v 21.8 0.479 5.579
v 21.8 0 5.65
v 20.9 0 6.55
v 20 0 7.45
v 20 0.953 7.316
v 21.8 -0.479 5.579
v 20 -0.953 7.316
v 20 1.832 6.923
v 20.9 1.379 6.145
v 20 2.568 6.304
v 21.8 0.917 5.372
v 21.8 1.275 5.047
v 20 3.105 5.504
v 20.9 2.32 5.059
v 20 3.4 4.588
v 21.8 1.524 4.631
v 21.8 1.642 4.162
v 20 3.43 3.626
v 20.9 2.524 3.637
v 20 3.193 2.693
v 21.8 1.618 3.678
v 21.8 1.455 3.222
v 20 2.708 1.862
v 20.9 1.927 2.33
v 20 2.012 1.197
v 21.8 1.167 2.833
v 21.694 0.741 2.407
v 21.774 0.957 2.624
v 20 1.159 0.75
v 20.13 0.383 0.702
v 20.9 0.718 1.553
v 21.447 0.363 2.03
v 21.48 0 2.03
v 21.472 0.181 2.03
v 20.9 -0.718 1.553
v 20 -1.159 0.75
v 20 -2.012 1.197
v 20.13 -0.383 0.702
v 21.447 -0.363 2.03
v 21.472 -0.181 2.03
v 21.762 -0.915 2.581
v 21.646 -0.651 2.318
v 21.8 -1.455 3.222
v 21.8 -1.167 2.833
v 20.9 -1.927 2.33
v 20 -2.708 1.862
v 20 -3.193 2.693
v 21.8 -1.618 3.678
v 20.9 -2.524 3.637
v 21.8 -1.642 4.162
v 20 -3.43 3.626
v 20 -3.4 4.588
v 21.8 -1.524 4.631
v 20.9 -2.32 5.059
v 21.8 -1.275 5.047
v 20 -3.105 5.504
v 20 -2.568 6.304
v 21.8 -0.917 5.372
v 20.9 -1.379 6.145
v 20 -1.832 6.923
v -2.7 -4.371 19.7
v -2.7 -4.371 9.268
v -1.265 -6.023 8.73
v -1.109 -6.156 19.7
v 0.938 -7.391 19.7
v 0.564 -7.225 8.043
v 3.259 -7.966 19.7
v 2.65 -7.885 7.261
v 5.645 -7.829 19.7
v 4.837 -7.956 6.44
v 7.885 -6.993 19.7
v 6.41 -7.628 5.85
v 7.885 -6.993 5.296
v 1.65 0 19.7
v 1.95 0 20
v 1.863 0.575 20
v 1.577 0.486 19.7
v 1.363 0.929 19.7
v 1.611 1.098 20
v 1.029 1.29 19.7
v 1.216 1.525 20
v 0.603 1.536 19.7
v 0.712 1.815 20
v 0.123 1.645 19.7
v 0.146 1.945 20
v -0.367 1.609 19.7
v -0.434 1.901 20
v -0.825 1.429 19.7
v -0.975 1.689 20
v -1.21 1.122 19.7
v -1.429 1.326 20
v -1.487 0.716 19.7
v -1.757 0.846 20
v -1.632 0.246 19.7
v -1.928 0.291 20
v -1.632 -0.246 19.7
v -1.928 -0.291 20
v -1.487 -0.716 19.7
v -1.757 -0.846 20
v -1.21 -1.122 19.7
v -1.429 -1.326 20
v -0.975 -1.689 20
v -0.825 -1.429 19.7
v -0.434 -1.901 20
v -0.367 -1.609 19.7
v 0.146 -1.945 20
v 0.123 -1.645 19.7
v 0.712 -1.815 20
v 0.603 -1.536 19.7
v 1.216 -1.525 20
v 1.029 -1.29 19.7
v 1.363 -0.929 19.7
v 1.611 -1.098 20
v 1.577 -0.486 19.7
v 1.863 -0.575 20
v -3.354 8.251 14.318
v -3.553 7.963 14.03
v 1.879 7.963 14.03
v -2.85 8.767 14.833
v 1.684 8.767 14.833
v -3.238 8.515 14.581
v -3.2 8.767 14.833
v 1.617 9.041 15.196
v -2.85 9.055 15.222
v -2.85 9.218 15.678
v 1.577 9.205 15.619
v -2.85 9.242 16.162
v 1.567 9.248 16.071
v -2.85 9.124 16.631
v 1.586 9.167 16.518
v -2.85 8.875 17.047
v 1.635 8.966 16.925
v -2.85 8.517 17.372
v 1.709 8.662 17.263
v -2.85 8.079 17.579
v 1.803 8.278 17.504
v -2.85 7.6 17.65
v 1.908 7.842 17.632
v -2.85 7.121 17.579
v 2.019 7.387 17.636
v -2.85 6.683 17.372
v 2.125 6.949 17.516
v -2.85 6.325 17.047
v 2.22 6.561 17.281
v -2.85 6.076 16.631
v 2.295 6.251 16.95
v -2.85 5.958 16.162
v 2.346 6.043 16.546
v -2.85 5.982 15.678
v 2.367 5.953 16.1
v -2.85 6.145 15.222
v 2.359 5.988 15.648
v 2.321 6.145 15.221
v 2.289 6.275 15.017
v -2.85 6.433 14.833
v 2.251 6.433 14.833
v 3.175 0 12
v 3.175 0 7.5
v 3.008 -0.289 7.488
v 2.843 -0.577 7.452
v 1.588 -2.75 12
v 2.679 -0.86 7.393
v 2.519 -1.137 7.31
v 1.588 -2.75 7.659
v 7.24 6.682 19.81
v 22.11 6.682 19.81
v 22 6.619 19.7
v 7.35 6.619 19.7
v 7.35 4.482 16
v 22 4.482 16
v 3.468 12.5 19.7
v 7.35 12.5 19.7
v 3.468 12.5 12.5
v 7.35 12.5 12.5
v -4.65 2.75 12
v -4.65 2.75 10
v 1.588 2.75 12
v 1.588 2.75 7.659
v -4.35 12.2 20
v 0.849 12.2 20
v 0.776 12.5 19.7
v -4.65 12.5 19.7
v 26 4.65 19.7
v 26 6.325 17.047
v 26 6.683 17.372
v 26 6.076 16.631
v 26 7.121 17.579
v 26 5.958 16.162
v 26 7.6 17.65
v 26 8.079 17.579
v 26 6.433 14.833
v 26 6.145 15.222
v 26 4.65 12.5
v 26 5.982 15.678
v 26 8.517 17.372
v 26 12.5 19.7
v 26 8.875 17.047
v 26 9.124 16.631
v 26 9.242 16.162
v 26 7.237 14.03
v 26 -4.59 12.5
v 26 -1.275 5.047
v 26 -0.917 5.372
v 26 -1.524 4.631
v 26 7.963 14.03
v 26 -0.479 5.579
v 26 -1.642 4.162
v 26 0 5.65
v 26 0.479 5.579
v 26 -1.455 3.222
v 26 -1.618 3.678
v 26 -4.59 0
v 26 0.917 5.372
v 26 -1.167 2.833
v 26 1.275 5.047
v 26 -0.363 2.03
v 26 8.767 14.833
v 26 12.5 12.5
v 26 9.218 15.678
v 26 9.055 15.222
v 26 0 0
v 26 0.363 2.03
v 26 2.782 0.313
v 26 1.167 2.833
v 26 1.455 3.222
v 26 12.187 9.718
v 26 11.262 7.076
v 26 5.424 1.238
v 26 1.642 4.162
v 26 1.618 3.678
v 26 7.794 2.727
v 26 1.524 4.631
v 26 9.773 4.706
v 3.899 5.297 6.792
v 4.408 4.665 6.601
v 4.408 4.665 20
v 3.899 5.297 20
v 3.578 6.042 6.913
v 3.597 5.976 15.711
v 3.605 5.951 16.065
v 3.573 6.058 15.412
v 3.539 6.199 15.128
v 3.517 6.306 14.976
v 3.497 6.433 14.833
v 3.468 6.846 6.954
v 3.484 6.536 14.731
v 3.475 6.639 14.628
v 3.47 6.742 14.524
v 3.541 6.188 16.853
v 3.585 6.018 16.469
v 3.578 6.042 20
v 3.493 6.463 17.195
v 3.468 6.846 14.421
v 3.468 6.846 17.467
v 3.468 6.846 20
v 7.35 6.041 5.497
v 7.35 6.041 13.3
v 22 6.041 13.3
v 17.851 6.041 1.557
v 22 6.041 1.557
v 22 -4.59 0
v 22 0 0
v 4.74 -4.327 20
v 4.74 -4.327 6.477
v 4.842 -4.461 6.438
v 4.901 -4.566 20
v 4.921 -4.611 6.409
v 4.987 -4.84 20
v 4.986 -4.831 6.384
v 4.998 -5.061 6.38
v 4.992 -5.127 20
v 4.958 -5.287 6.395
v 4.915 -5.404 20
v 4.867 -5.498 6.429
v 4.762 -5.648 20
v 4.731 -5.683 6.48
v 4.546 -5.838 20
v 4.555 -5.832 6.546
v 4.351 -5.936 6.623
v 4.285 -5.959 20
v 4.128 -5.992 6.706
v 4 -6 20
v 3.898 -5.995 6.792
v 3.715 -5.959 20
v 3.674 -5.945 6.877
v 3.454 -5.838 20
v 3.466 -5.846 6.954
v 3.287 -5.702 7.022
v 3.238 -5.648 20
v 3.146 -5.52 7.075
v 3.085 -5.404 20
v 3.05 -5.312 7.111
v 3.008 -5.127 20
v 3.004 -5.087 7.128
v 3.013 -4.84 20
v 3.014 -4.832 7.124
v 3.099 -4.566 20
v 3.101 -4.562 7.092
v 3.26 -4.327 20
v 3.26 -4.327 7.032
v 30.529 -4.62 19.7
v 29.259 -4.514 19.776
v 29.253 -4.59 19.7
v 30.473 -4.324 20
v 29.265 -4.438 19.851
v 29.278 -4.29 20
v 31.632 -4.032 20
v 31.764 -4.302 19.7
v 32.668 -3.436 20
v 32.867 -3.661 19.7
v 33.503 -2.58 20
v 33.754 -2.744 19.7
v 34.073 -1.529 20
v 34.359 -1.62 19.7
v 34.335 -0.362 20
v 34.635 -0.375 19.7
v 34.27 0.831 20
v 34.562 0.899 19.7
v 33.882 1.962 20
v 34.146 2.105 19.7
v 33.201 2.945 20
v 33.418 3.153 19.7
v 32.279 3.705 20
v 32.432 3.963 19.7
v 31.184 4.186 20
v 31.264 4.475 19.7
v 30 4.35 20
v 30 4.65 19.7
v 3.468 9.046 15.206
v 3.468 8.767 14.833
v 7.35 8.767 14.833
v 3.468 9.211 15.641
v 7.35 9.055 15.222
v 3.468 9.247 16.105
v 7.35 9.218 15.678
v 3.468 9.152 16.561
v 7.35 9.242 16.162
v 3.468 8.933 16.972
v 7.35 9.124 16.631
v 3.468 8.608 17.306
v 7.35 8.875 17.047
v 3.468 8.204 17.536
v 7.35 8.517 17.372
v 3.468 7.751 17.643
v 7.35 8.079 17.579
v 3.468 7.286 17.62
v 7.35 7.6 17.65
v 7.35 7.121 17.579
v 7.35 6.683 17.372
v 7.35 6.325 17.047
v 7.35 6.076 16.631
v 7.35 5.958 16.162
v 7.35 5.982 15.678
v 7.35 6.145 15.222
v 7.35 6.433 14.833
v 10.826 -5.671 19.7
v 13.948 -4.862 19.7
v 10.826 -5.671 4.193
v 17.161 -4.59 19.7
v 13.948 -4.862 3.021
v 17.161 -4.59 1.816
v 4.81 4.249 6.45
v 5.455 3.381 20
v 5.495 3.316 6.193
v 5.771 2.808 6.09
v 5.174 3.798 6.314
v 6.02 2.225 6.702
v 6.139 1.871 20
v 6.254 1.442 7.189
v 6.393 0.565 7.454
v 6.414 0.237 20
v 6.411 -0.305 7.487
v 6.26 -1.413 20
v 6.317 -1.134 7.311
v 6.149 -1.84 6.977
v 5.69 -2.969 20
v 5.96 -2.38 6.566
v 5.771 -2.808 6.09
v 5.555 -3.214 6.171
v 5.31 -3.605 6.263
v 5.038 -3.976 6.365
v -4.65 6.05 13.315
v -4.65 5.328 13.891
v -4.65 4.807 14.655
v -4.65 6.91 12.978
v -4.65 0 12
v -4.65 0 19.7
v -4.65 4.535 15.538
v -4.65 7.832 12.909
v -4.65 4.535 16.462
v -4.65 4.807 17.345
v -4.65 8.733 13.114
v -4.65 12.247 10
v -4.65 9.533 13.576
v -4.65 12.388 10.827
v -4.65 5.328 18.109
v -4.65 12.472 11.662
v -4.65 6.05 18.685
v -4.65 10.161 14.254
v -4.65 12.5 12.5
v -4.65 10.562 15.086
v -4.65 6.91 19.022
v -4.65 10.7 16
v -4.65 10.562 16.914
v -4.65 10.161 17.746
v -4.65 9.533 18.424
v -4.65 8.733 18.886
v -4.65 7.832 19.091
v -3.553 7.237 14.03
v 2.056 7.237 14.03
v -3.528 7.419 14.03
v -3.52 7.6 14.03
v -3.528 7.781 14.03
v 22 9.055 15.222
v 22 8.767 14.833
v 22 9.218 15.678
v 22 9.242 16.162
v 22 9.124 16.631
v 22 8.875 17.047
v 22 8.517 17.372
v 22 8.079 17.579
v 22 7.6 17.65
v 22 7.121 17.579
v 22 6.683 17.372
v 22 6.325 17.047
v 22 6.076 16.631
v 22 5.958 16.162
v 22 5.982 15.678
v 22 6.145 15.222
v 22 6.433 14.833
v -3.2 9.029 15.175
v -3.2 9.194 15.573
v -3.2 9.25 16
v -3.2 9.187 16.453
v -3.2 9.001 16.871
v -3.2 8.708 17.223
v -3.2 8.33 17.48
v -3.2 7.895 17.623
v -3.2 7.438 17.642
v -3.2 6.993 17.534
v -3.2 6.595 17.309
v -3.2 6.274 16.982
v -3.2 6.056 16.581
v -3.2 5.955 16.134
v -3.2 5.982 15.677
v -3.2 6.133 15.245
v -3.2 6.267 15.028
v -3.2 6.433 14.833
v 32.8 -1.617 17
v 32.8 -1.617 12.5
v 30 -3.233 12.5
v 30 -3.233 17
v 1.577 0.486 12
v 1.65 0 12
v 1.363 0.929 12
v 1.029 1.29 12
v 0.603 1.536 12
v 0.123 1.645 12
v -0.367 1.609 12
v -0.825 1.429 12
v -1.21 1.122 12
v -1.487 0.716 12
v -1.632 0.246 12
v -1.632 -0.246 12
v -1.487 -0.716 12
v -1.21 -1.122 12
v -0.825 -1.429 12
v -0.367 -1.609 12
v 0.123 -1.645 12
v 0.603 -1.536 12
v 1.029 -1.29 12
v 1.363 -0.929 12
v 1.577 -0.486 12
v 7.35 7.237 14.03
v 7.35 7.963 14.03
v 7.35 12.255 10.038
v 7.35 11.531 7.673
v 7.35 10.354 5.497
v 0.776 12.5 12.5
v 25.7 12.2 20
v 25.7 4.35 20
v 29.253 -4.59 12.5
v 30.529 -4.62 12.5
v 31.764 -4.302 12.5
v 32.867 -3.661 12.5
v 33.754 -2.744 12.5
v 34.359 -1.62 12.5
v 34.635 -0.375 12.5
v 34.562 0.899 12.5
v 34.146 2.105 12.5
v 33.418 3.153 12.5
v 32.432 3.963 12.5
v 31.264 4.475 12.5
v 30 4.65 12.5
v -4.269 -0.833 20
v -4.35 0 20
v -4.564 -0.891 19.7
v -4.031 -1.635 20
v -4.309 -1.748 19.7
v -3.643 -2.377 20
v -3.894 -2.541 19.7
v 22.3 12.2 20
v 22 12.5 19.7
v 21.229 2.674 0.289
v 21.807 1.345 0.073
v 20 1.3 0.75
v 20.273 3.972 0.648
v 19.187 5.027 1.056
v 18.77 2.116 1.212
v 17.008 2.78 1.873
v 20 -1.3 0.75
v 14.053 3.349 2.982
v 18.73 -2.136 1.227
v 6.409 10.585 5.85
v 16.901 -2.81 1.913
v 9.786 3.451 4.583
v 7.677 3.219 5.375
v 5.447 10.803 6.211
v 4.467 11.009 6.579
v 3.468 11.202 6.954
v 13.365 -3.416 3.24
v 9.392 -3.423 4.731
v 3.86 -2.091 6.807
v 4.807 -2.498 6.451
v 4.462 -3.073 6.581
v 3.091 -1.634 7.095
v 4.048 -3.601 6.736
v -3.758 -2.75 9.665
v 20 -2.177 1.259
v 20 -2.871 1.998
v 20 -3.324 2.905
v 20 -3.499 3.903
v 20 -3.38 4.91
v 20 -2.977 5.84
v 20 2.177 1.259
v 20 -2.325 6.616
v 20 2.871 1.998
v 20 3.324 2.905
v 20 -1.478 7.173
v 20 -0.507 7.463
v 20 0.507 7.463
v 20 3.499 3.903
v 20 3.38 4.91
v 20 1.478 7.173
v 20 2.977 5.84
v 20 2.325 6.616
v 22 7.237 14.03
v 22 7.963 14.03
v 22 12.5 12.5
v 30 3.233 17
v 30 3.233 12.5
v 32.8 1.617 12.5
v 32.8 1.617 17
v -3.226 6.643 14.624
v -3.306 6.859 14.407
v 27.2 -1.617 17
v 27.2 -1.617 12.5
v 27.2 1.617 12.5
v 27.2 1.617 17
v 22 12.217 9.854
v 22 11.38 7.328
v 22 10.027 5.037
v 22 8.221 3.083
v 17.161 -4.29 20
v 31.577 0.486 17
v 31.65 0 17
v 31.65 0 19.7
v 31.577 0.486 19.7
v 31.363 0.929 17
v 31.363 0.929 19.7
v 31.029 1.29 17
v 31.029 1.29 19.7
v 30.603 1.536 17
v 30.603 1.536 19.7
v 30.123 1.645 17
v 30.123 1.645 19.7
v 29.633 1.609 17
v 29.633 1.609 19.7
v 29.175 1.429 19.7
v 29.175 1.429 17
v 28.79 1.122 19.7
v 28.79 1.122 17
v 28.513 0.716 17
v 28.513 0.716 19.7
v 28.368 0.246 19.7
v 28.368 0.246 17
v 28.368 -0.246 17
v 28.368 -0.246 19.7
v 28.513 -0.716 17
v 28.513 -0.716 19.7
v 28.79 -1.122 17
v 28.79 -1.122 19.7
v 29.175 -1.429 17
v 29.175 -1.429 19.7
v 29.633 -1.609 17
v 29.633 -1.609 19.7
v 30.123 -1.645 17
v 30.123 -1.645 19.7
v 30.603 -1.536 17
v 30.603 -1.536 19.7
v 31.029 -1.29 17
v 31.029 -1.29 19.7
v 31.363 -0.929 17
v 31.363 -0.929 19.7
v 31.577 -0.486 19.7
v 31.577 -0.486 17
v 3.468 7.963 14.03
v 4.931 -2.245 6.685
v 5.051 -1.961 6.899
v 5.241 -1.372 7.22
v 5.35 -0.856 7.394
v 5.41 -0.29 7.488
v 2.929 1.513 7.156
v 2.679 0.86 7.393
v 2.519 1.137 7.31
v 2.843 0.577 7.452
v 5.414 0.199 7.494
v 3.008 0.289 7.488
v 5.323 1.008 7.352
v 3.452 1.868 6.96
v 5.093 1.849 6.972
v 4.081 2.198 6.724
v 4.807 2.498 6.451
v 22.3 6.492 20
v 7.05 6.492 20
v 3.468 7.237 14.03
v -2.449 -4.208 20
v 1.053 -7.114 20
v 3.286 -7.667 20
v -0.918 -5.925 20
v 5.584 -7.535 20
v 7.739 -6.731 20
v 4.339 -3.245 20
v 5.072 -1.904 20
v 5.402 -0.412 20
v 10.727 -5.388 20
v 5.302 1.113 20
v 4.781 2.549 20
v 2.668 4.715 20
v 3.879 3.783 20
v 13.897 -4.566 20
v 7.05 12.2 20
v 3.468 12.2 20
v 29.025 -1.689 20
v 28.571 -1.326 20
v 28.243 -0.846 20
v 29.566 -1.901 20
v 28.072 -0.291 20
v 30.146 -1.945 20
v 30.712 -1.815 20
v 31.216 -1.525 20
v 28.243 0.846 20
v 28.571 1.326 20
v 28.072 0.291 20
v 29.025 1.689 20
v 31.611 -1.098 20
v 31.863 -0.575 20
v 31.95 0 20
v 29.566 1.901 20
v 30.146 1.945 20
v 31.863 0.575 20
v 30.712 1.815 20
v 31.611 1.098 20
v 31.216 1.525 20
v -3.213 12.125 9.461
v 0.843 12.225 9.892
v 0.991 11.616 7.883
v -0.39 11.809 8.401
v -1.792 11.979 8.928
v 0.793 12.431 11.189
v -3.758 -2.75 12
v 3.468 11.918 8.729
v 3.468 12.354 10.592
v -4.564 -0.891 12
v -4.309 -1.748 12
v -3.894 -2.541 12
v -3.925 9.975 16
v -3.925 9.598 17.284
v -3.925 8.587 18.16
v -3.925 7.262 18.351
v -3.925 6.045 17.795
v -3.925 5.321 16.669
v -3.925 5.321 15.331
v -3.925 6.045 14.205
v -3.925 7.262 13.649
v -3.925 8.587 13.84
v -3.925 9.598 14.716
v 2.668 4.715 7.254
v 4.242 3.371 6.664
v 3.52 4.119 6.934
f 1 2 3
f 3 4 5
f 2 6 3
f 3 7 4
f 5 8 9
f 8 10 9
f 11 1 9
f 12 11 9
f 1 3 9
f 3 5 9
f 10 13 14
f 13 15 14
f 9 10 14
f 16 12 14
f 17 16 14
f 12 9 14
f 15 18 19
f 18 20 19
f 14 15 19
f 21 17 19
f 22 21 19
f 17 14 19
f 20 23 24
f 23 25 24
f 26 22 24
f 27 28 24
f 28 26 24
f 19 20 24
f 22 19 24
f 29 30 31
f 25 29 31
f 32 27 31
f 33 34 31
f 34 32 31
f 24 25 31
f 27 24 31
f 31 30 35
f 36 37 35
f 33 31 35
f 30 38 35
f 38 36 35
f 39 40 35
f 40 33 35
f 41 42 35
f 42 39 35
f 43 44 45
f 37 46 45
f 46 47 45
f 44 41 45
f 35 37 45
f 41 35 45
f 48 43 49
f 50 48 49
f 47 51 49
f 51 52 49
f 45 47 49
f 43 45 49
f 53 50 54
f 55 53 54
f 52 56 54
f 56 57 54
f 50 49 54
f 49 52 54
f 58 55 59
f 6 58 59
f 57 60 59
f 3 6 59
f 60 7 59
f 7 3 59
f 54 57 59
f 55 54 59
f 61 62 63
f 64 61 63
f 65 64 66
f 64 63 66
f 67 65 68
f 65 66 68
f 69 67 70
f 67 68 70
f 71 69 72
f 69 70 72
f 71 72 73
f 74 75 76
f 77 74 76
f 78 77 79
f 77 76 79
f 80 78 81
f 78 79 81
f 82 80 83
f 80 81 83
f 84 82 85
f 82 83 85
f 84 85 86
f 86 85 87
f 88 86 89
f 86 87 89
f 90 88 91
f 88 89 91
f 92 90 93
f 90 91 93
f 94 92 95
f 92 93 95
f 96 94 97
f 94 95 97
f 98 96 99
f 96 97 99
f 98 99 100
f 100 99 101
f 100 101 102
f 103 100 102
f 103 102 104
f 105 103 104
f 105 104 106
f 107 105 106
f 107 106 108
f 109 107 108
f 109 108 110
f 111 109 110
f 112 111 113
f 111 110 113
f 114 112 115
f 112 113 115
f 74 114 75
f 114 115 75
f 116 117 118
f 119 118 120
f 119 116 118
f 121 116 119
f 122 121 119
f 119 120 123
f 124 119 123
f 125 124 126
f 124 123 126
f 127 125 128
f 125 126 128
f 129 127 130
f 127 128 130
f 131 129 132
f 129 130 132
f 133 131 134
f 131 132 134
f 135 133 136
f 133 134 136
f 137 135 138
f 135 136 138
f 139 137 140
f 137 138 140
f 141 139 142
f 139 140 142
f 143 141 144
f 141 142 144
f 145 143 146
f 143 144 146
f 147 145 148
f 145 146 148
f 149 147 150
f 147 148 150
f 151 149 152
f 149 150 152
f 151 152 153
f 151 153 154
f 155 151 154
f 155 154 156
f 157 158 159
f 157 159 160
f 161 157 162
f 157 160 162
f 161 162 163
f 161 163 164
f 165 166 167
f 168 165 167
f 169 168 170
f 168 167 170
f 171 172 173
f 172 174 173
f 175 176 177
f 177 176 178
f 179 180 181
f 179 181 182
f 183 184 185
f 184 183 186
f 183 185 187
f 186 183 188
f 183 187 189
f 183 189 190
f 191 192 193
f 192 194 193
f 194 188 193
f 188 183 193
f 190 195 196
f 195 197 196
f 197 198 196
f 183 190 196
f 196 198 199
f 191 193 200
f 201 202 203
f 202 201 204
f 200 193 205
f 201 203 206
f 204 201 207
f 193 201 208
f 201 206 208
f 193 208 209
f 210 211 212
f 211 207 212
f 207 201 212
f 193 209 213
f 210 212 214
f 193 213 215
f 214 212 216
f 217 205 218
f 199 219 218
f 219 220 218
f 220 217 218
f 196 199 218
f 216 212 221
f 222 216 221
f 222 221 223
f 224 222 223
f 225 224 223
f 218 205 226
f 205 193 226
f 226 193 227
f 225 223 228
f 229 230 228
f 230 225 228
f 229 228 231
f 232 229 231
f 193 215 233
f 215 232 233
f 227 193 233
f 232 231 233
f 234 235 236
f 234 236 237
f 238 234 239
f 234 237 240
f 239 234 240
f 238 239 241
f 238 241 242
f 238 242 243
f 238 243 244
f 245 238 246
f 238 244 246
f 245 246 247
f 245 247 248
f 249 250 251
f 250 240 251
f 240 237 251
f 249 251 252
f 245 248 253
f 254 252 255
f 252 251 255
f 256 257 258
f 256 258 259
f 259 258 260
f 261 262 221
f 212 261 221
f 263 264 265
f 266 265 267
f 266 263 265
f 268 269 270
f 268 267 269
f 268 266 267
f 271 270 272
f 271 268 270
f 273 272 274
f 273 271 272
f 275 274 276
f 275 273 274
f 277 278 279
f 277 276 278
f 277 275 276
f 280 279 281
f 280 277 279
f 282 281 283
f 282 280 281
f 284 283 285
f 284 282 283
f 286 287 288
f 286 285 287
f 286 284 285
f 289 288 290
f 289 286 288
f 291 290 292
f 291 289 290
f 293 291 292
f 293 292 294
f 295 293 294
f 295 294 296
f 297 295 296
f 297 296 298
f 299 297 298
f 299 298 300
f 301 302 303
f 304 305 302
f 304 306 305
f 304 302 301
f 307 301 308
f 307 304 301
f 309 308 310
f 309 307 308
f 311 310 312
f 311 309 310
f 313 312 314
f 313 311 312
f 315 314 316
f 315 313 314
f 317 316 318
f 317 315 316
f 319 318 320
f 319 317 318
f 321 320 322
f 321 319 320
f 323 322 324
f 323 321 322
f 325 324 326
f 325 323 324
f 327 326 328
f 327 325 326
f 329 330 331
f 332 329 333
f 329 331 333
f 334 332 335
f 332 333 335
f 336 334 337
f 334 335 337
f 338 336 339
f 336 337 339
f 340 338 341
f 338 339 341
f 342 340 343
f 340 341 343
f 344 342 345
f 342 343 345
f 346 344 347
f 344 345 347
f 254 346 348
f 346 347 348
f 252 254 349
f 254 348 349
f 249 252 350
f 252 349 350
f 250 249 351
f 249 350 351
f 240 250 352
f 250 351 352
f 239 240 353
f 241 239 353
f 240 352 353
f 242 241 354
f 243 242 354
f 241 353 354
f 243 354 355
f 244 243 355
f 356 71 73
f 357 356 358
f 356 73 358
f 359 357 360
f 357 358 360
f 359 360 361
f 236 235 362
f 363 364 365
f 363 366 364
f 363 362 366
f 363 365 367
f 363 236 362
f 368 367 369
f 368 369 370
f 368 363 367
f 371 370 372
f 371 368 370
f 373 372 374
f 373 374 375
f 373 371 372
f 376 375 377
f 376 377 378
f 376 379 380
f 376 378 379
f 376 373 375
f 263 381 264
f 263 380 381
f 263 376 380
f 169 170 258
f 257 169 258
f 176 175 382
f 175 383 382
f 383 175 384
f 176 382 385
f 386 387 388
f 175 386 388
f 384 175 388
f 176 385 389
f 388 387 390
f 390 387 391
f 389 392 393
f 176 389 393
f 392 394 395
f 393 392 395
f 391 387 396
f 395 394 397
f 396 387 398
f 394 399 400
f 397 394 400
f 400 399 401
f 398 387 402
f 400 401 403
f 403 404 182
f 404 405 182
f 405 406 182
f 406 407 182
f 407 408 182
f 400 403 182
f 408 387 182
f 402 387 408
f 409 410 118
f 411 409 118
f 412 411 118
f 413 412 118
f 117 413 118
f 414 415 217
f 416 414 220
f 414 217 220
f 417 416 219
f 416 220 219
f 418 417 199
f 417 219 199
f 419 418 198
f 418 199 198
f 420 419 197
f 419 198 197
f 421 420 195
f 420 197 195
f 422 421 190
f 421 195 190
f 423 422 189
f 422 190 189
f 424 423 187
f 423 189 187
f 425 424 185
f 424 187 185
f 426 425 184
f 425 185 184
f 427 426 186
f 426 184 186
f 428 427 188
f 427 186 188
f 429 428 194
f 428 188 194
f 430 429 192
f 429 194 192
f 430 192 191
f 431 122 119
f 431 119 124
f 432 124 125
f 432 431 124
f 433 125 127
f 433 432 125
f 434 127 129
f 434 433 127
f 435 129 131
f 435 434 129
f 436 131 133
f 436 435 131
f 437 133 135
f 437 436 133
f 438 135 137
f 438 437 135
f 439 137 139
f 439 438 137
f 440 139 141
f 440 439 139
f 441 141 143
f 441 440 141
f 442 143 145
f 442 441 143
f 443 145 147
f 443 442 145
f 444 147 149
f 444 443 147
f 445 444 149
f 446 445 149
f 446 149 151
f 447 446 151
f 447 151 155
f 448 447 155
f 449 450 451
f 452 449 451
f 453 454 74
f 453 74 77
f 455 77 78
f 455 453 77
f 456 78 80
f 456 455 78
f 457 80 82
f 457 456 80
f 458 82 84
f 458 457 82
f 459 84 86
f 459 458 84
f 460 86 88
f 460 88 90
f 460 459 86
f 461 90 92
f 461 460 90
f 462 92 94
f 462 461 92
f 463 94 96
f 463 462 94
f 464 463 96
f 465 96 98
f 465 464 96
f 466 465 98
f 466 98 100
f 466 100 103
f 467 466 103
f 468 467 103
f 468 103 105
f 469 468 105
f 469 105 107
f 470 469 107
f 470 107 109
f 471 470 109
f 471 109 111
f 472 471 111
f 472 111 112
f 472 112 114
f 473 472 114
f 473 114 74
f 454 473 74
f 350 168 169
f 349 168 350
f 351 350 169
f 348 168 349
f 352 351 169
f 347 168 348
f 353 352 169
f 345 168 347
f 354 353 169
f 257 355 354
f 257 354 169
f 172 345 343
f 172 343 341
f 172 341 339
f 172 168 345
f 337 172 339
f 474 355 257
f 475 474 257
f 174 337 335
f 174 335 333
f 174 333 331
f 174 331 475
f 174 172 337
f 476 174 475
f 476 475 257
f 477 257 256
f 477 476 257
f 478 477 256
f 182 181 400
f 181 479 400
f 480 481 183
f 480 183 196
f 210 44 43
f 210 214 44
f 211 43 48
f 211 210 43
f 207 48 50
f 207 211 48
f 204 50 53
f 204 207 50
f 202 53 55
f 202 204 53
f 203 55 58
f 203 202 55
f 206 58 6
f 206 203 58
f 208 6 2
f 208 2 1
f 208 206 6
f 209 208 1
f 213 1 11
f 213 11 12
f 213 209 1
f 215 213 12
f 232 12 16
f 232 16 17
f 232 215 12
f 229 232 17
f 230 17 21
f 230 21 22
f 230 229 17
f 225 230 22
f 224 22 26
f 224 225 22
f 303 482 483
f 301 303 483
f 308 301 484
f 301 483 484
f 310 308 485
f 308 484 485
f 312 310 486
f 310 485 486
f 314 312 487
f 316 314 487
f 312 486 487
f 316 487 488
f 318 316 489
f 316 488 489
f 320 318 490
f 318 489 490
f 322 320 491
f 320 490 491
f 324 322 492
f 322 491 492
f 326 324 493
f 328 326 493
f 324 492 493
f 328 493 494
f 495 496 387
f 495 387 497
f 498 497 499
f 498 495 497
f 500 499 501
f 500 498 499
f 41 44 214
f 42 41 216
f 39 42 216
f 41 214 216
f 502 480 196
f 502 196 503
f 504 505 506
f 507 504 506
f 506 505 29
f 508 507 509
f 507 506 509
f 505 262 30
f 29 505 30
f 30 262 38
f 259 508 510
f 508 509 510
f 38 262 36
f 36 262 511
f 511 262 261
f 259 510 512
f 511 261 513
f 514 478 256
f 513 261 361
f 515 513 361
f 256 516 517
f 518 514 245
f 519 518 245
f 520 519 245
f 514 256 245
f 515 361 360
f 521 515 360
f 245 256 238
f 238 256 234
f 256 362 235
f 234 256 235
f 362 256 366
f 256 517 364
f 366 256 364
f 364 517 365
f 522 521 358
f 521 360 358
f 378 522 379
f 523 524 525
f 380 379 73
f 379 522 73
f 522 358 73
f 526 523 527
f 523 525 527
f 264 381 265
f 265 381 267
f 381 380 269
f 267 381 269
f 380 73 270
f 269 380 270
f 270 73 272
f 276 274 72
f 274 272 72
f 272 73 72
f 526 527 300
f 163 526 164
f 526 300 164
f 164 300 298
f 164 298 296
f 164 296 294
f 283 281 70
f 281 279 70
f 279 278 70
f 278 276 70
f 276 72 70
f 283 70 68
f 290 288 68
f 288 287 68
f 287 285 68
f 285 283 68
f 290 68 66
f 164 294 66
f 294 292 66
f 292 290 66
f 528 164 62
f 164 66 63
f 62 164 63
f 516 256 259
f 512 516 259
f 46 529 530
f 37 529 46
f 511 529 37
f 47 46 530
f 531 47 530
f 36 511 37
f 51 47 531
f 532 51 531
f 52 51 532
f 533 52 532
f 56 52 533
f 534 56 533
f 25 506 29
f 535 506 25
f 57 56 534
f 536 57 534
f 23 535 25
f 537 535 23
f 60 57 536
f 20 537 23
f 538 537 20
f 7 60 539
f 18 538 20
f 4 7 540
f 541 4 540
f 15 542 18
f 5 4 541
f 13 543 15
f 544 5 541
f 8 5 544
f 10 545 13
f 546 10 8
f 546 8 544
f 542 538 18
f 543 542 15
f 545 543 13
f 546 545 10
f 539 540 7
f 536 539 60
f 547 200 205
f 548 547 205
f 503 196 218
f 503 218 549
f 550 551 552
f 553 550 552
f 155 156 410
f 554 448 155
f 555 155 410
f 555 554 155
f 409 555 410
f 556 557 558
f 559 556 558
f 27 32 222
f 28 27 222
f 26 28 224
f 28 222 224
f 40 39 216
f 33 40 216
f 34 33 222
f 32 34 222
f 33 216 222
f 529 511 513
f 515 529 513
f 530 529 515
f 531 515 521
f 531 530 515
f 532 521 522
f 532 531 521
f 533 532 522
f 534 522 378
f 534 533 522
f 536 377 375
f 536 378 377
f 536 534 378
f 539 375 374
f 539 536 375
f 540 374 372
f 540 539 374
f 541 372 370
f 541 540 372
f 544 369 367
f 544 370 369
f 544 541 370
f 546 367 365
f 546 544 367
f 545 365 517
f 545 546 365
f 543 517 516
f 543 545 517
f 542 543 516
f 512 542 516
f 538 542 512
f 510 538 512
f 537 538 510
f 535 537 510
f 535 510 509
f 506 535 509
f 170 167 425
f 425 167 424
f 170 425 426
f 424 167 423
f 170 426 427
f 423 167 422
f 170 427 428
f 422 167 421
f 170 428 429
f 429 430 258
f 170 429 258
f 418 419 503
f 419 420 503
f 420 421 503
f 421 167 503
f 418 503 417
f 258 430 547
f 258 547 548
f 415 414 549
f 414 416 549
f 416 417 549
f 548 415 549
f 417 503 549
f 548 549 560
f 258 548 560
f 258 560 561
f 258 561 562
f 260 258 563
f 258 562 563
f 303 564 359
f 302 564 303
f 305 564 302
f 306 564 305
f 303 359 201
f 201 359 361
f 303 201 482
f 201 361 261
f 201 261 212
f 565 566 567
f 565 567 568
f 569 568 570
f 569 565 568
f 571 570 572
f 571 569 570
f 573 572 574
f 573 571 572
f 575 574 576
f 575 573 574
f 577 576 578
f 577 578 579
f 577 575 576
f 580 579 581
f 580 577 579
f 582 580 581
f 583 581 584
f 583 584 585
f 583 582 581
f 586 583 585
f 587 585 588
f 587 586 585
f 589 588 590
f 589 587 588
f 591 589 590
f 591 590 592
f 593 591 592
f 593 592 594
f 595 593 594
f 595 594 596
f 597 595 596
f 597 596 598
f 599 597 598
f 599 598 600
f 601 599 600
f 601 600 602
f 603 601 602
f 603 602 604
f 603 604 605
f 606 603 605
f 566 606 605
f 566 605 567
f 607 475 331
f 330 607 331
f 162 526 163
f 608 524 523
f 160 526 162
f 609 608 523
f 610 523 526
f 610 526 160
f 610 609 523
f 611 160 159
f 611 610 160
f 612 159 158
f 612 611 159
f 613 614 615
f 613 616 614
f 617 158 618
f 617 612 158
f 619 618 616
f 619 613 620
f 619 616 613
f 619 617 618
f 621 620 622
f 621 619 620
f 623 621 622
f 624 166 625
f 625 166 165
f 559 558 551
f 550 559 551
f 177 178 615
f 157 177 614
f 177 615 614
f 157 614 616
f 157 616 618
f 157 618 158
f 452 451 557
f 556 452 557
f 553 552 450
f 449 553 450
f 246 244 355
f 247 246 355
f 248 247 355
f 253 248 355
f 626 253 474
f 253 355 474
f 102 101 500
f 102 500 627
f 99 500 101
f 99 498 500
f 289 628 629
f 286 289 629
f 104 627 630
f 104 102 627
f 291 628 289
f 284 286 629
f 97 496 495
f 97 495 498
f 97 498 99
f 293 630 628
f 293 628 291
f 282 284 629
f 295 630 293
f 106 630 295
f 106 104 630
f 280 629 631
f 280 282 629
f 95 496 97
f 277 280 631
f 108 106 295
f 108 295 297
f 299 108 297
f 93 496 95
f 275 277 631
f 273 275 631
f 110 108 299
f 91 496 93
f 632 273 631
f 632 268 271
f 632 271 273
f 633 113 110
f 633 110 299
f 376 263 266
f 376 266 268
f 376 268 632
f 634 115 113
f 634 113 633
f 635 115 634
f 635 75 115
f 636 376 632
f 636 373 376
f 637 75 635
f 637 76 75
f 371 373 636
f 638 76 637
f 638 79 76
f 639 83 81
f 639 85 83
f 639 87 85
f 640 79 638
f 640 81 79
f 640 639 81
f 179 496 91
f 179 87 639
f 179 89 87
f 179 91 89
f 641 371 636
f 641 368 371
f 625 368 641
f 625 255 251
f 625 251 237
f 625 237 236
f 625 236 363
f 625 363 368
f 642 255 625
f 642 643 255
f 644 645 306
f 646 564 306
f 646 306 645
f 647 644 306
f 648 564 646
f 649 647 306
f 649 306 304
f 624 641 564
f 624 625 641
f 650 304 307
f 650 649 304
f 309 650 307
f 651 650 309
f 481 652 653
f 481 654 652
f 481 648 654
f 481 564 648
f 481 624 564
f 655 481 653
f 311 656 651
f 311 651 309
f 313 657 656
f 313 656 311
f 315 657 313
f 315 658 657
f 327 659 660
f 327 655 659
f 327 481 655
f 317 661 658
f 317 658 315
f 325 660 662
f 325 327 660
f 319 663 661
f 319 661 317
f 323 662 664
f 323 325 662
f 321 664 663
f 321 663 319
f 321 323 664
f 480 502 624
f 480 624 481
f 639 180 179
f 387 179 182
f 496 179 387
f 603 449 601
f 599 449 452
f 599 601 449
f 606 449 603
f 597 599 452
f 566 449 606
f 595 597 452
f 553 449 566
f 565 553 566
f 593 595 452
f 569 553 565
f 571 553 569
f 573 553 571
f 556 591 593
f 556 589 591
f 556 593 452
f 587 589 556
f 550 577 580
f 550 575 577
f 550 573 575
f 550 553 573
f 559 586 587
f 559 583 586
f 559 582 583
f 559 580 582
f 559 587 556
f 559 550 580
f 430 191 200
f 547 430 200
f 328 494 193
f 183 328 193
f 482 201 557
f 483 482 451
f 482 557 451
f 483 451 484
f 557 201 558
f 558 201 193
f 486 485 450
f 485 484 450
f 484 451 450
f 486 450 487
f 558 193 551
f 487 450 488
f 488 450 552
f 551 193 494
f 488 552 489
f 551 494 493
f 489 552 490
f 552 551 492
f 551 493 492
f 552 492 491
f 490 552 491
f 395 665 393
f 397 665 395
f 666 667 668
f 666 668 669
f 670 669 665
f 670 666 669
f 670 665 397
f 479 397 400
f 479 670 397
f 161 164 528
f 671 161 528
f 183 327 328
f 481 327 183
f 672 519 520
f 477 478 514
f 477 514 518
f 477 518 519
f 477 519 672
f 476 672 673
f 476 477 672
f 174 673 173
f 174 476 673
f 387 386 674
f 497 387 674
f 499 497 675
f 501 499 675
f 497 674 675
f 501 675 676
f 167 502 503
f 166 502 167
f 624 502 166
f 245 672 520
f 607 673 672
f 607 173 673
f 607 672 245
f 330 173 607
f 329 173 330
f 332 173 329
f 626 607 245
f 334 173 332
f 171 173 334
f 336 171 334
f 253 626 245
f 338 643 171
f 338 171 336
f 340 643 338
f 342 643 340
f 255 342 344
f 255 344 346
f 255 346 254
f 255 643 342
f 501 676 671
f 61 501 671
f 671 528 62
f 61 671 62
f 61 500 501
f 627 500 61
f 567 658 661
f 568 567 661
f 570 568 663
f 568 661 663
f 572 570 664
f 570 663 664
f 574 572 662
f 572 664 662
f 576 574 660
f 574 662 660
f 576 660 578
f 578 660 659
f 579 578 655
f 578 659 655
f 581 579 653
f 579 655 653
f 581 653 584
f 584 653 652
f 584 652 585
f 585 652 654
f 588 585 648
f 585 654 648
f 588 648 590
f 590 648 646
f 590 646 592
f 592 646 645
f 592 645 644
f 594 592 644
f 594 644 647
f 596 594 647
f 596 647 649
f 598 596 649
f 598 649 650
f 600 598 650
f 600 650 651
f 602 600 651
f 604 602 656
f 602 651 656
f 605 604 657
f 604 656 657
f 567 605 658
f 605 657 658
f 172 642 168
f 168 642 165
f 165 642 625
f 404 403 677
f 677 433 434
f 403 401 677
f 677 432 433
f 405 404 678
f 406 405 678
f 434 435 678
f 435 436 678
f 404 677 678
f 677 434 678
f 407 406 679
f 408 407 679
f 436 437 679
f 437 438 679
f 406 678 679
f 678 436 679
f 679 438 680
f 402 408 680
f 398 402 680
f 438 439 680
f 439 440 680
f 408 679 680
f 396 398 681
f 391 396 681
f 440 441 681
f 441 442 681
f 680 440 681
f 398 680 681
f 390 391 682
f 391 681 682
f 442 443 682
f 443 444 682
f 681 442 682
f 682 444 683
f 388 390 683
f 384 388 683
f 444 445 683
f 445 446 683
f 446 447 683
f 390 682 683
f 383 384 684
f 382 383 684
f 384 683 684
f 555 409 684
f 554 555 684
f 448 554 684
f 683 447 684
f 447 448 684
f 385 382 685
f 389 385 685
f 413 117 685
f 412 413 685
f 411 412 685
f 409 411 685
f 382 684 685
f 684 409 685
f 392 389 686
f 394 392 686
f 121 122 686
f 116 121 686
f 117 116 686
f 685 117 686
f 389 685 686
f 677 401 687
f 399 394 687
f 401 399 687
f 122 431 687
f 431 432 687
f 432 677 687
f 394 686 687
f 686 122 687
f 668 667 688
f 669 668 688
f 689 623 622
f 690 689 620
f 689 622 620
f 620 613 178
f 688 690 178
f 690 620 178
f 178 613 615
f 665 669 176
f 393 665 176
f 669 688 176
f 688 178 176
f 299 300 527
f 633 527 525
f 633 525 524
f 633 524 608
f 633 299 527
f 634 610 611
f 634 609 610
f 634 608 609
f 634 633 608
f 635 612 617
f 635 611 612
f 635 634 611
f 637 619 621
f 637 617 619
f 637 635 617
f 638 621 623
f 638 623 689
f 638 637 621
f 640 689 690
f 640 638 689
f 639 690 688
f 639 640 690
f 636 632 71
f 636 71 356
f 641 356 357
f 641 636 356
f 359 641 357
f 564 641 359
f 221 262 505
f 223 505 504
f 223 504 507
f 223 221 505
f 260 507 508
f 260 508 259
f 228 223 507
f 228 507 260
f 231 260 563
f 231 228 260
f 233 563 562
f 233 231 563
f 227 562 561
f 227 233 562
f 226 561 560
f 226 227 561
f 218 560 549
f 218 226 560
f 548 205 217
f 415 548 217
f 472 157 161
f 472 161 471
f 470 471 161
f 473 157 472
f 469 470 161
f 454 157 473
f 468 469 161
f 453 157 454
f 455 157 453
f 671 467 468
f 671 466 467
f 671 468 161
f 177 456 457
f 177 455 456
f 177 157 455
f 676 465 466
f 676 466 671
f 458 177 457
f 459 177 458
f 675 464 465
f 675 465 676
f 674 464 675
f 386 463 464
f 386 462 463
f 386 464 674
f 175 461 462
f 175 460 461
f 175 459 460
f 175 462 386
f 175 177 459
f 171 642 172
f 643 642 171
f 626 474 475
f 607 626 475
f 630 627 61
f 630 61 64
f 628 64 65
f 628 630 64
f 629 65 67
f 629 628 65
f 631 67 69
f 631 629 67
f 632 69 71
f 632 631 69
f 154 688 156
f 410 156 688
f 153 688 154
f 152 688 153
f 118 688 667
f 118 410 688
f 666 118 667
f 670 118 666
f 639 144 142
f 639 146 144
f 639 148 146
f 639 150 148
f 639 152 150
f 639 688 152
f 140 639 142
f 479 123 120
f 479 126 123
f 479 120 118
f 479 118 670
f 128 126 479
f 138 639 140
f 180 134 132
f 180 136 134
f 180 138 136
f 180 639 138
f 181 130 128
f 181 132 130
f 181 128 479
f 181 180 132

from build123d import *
from OCP.BRepFilletAPI import BRepFilletAPI_MakeChamfer

# Parameters (mm, degrees)
SKETCH1_R                = 1.65
BOSS_EXTRUDE1_DEPTH      = 20
SKETCH3_R                = 1.65
CUT_EXTRUDE3_DEPTH       = 39.673925324
CUT_EXTRUDE4_DEPTH       = 12
CUT_EXTRUDE5_START       = -4
CUT_EXTRUDE5_DEPTH       = 14.65
CUT_EXTRUDE11_DEPTH      = 42.915062925
CUT_EXTRUDE11_DEPTH_BACK = 42.915062925
CUT_EXTRUDE10_DEPTH      = 5
CUT_EXTRUDE10_DEPTH_BACK = 39.898875305
SKETCH10_W               = 9.115200733
SKETCH10_H               = 9.576012389
CUT_EXTRUDE7_DEPTH       = 4.5
CUT_EXTRUDE8_DEPTH       = 36.587532929
CUT_EXTRUDE8_DEPTH_BACK  = 36.587532929
SKETCH8_R                = 1.65
CUT_EXTRUDE9_START       = 2
SKETCH9_R                = 3.5
CUT_EXTRUDE9_DEPTH       = 34.587532929
CHAMFER6_SIZE            = 1.8
CUT_EXTRUDE12_DEPTH      = 39.673925324
CHAMFER7_SIZE            = 0.3
CHAMFER7_SIZE2           = 0.219615242
CUT_EXTRUDE13_DEPTH      = 42.915062925
SKETCH14_R               = 3.1
CUT_EXTRUDE14_DEPTH      = 1.8
CHAMFER8_START           = -4.6500001
CHAMFER8_OUTLINE_R       = 3.1
CHAMFER8_DEPTH           = 1.8000001
CHAMFER8_START_2         = -4.65
CHAMFER8_3_DEPTH         = 1.8
FILLET1_R                = 3


with BuildPart() as part:
    # Sketch1 → Boss-Extrude1 (new body)
    with BuildSketch(Plane.XY):
        with BuildLine():
            Line((-3.894375, -2.540933561), (-2.7, -4.371498599))
            ThreePointArc((-2.7, -4.371498599), (2.076657931, -7.765356095), (7.885150706, -6.993254178))
            ThreePointArc((7.885150706, -6.993254178), (12.369935761, -5.200285461), (17.161085198, -4.589612979))
            Line((17.161085198, -4.589612979), (29.253037683, -4.589612979))
            ThreePointArc((29.253037683, -4.589612979), (34.634878658, -0.374699645), (30, 4.65))
            Line((30, 4.65), (26, 4.65))
            Line((26, 4.65), (26, 12.5))
            Line((26, 12.5), (-4.65, 12.5))
            Line((-4.65, 12.5), (-4.65, 0))
            ThreePointArc((-4.65, 0), (-4.457092312, -1.325453932), (-3.894375, -2.540933561))
        make_face()
        Circle(SKETCH1_R, mode=Mode.SUBTRACT)
        with Locations((30, 0)):
            Circle(SKETCH1_R, mode=Mode.SUBTRACT)
    extrude(amount=BOSS_EXTRUDE1_DEPTH)

    # Sketch3 → Cut-Extrude3 (cut, through all)
    with BuildSketch(Plane(origin=(26, 0, 0), x_dir=(0, 0, -1), z_dir=(1, 0, 0))):
        with Locations(Location((-16, 7.6, 0), (0, 0, 90))):
            Circle(SKETCH3_R)
    extrude(amount=-CUT_EXTRUDE3_DEPTH, mode=Mode.SUBTRACT)

    # Sketch4 → Cut-Extrude4 (cut)
    with BuildSketch(Plane(origin=(0, 0, 0), x_dir=(-1, 0, 0), z_dir=(0, 0, -1))):
        Polygon((1.58771324, -2.75), (6.896922601, -2.75), (6.896922601, 2.75), (1.58771324, 2.75), (-1.58771324, 2.75), (-3.175426481, 0), (-1.58771324, -2.75), align=None)
    extrude(amount=-CUT_EXTRUDE4_DEPTH, mode=Mode.SUBTRACT)

    # Sketch5 → Cut-Extrude5 (cut)
    with BuildSketch(Plane(origin=(26, 0, 0), x_dir=(0, 0, -1), z_dir=(1, 0, 0)).offset(CUT_EXTRUDE5_START)):
        Polygon((-13.3, 6.041154273), (0, 6.041154273), (0, 12.5), (-20, 13.02709253), (-20, 6.791709623), (-16, 4.482308546), align=None)
    extrude(amount=-CUT_EXTRUDE5_DEPTH, mode=Mode.SUBTRACT)

    # Sketch11 → Cut-Extrude11 (cut, two sides: drawn at the far end of the back side and taken through both)
    with BuildSketch(Plane(origin=(0, 0, 0), x_dir=(1, 0, 0), z_dir=(0, 1, 0)).offset(-CUT_EXTRUDE11_DEPTH_BACK)):
        Polygon((22, 0), (-4.65, -10), (-4.65, 0), align=None)
    extrude(amount=CUT_EXTRUDE11_DEPTH + CUT_EXTRUDE11_DEPTH_BACK, mode=Mode.SUBTRACT)

    # Sketch10 → Cut-Extrude10 (cut, two sides: drawn at the far end of the back side and taken through both)
    with BuildSketch(Plane.XY.offset(7.5).offset(-CUT_EXTRUDE10_DEPTH_BACK)):
        with Locations((30.557600367, -0.138006194)):
            Rectangle(SKETCH10_W, SKETCH10_H)
    extrude(amount=CUT_EXTRUDE10_DEPTH + CUT_EXTRUDE10_DEPTH_BACK, mode=Mode.SUBTRACT)

    # Sketch7 → Cut-Extrude7 (cut)
    with BuildSketch(Plane(origin=(0, 0, 12.5), x_dir=(-1, 0, 0), z_dir=(0, 0, -1))):
        Polygon((-27.2, -1.616580754), (-27.2, 1.616580754), (-30, 3.233161507), (-32.8, 1.616580754), (-32.8, -1.616580754), (-30, -3.233161507), align=None)
    extrude(amount=-CUT_EXTRUDE7_DEPTH, mode=Mode.SUBTRACT)

    # Sketch8 → Cut-Extrude8 (cut, two sides: drawn at the far end of the back side and taken through both)
    with BuildSketch(Plane.ZY.offset(-22).offset(-CUT_EXTRUDE8_DEPTH_BACK)):
        with Locations((4, 0)):
            Circle(SKETCH8_R)
        with BuildLine():
            Line((12.5, 12.5), (0, 12.5))
            Line((0, 12.5), (0, 0))
            ThreePointArc((0, 0), (3.661165235, 8.838834765), (12.5, 12.5))
        make_face()
    extrude(amount=CUT_EXTRUDE8_DEPTH + CUT_EXTRUDE8_DEPTH_BACK, mode=Mode.SUBTRACT)

    # Sketch9 → Cut-Extrude9 (cut, through all)
    with BuildSketch(Plane.ZY.offset(-22).offset(CUT_EXTRUDE9_START)):
        with Locations((4, 0)):
            Circle(SKETCH9_R)
    extrude(amount=CUT_EXTRUDE9_DEPTH, mode=Mode.SUBTRACT)

    # Chamfer6
    # the kernel refuses this chamfer: 1.8 mm, written as the material it takes off along each edge
    with BuildSketch(Plane(origin=(20, 0, 4), x_dir=(0, 0, 1), z_dir=(0, -1, 0))) as chamfer6_piece_1:
        Polygon((1.65, -CHAMFER6_SIZE), (1.65 + CHAMFER6_SIZE, 0), (1.65, 0), align=None)
    revolve(axis=Axis((20, 0, 4), (-1, 0, 0)), mode=Mode.SUBTRACT)

    # Sketch12 → Cut-Extrude12 (cut, through all)
    with BuildSketch(Plane(origin=(26, 0, 0), x_dir=(0, 0, -1), z_dir=(1, 0, 0))):
        Polygon((-4, 0), (-2.833273811, -1.166726189), (-2.03, -0.363452378), (-2.03, 0.363452378), (-2.833273811, 1.166726189), align=None)
        Polygon((-16, 7.6), (-14.833273811, 6.433273811), (-14.03, 7.236547622), (-14.03, 7.963452378), (-14.833273811, 8.766726189), align=None)
    extrude(amount=-CUT_EXTRUDE12_DEPTH, mode=Mode.SUBTRACT)

    # Chamfer7: one chamfer whose edges measure the first distance from different faces: ONE call of the kernel's chamfer builder (chamfer() names one face for all edges)
    chamfer7_edges_1 = [part.edges().sort_by_distance(p)[0] for p in [
        (-4.457092312, -1.325453932, 20),
        (-3.2971875, -3.45621608, 20),
        (2.076657931, -7.765356095, 20),
        (12.369935761, -5.200285461, 20),
        (23.207061441, -4.589612979, 20),
        (34.634878658, -0.374699645, 20),
        (-1.65, 0, 20),
        (28, 4.65, 20),
        (28.35, 0, 20),
        (26, 8.575, 20),
        (24, 12.5, 20),
        (-4.65, 6.25, 20),
        (1.35, 12.5, 20),
        (22, 9.645854812, 20),
        (7.35, 9.645854812, 20),
    ]]
    chamfer7_edges_2 = [part.edges().sort_by_distance(p)[0] for p in [
        (14.675, 6.791709623, 20),
    ]]
    chamfer7_side_2 = [part.faces().sort_by_distance(p)[0] for p in [
        (12.200528513, 2.041085784, 20),
    ]]
    chamfer7 = BRepFilletAPI_MakeChamfer(part.part.solid().wrapped)
    for e in chamfer7_edges_1:
        chamfer7.Add(CHAMFER7_SIZE, e.wrapped)
    for e in chamfer7_edges_2:
        chamfer7.Add(CHAMFER7_SIZE, CHAMFER7_SIZE2, e.wrapped, chamfer7_side_2[0].wrapped)  # the first distance lies on this face
    add(Compound.cast(chamfer7.Shape()), mode=Mode.REPLACE)

    # Sketch13 → Cut-Extrude13 (cut, through all)
    with BuildSketch(Plane.XY.offset(20)):
        with BuildLine():
            Line((2.668200105, 13.768506402), (3.468200105, 13.768506402))
            Line((3.468200105, 13.768506402), (3.468200105, 5.400266455))
            ThreePointArc((3.468200105, 5.400266455), (6.363895276, 0.831941508), (4.739860969, -4.327240201))
            ThreePointArc((4.739860969, -4.327240201), (4, -6), (3.260139031, -4.327240201))
            ThreePointArc((3.260139031, -4.327240201), (5.406317163, 0.353905339), (2.668200105, 4.715317853))
            Line((2.668200105, 4.715317853), (0.468200105, 13.768506402))
            Line((0.468200105, 13.768506402), (2.668200105, 13.768506402))
        make_face()
    extrude(amount=-CUT_EXTRUDE13_DEPTH, mode=Mode.SUBTRACT)

    # Sketch14 → Cut-Extrude14 (cut)
    with BuildSketch(Plane.ZY.offset(4.65)):
        with Locations(Location((16, 7.6, 0), (0, 0, 270))):
            Circle(SKETCH14_R)
    extrude(amount=-CUT_EXTRUDE14_DEPTH, mode=Mode.SUBTRACT)

    # Chamfer8: read off the stored shape, not the designer's step
    # Chamfer8 outline → Chamfer8 (add)
    with BuildSketch(Plane.YZ.offset(CHAMFER8_START)):
        with Locations((7.6, 16)):
            Circle(CHAMFER8_OUTLINE_R)
    extrude(amount=CHAMFER8_DEPTH)

    # Chamfer8 2 outline → Chamfer8 2 (revolve, cut)
    with BuildSketch(Plane(origin=(0, 7.6, 16), x_dir=(0, 1, 0), z_dir=(0, 0, -1))):
        Polygon((0, -4.65), (3.1, -4.65), (1.64999615, -3.19999615), (0, -3.19999615), align=None)
    revolve(axis=Axis((0, 7.6, 16), (1, 0, 0)), mode=Mode.SUBTRACT)

    # Chamfer8 3 outline → Chamfer8 3 (cut)
    with BuildSketch(Plane.YZ.offset(CHAMFER8_START_2)):
        with BuildLine():
            ThreePointArc((8.766726189, 14.833273811), (7.6, 17.65), (6.433273811, 14.833273811))
            Line((6.433273811, 14.833273811), (7.236547622, 14.03))
            Line((7.236547622, 14.03), (7.963452378, 14.03))
            Line((7.963452378, 14.03), (8.766726189, 14.833273811))
        make_face()
    extrude(amount=CHAMFER8_3_DEPTH, mode=Mode.SUBTRACT)

    # Fillet1
    # the kernel refuses this fillet: 3 mm, written as the material it takes off along each edge
    with BuildSketch(Plane(origin=(3.468200105, 5.400266455, 23.613279493), x_dir=(0.7875480221604082, -0.616253286231586, 0), z_dir=(0, 0, -1))) as fillet1_piece_1:
        with BuildLine():
            CenterArc((1.471965922, -2.987012306), FILLET1_R, 95.333346889, 46.623610266)
            Line((-0.890678145, -1.138252447), (0, 0))
            ThreePointArc((0, 0), (0.596557816, -0.027785198), (1.193115632, 0))
        make_face()
    extrude(amount=20.272787919, mode=Mode.SUBTRACT)


solid = part.part
